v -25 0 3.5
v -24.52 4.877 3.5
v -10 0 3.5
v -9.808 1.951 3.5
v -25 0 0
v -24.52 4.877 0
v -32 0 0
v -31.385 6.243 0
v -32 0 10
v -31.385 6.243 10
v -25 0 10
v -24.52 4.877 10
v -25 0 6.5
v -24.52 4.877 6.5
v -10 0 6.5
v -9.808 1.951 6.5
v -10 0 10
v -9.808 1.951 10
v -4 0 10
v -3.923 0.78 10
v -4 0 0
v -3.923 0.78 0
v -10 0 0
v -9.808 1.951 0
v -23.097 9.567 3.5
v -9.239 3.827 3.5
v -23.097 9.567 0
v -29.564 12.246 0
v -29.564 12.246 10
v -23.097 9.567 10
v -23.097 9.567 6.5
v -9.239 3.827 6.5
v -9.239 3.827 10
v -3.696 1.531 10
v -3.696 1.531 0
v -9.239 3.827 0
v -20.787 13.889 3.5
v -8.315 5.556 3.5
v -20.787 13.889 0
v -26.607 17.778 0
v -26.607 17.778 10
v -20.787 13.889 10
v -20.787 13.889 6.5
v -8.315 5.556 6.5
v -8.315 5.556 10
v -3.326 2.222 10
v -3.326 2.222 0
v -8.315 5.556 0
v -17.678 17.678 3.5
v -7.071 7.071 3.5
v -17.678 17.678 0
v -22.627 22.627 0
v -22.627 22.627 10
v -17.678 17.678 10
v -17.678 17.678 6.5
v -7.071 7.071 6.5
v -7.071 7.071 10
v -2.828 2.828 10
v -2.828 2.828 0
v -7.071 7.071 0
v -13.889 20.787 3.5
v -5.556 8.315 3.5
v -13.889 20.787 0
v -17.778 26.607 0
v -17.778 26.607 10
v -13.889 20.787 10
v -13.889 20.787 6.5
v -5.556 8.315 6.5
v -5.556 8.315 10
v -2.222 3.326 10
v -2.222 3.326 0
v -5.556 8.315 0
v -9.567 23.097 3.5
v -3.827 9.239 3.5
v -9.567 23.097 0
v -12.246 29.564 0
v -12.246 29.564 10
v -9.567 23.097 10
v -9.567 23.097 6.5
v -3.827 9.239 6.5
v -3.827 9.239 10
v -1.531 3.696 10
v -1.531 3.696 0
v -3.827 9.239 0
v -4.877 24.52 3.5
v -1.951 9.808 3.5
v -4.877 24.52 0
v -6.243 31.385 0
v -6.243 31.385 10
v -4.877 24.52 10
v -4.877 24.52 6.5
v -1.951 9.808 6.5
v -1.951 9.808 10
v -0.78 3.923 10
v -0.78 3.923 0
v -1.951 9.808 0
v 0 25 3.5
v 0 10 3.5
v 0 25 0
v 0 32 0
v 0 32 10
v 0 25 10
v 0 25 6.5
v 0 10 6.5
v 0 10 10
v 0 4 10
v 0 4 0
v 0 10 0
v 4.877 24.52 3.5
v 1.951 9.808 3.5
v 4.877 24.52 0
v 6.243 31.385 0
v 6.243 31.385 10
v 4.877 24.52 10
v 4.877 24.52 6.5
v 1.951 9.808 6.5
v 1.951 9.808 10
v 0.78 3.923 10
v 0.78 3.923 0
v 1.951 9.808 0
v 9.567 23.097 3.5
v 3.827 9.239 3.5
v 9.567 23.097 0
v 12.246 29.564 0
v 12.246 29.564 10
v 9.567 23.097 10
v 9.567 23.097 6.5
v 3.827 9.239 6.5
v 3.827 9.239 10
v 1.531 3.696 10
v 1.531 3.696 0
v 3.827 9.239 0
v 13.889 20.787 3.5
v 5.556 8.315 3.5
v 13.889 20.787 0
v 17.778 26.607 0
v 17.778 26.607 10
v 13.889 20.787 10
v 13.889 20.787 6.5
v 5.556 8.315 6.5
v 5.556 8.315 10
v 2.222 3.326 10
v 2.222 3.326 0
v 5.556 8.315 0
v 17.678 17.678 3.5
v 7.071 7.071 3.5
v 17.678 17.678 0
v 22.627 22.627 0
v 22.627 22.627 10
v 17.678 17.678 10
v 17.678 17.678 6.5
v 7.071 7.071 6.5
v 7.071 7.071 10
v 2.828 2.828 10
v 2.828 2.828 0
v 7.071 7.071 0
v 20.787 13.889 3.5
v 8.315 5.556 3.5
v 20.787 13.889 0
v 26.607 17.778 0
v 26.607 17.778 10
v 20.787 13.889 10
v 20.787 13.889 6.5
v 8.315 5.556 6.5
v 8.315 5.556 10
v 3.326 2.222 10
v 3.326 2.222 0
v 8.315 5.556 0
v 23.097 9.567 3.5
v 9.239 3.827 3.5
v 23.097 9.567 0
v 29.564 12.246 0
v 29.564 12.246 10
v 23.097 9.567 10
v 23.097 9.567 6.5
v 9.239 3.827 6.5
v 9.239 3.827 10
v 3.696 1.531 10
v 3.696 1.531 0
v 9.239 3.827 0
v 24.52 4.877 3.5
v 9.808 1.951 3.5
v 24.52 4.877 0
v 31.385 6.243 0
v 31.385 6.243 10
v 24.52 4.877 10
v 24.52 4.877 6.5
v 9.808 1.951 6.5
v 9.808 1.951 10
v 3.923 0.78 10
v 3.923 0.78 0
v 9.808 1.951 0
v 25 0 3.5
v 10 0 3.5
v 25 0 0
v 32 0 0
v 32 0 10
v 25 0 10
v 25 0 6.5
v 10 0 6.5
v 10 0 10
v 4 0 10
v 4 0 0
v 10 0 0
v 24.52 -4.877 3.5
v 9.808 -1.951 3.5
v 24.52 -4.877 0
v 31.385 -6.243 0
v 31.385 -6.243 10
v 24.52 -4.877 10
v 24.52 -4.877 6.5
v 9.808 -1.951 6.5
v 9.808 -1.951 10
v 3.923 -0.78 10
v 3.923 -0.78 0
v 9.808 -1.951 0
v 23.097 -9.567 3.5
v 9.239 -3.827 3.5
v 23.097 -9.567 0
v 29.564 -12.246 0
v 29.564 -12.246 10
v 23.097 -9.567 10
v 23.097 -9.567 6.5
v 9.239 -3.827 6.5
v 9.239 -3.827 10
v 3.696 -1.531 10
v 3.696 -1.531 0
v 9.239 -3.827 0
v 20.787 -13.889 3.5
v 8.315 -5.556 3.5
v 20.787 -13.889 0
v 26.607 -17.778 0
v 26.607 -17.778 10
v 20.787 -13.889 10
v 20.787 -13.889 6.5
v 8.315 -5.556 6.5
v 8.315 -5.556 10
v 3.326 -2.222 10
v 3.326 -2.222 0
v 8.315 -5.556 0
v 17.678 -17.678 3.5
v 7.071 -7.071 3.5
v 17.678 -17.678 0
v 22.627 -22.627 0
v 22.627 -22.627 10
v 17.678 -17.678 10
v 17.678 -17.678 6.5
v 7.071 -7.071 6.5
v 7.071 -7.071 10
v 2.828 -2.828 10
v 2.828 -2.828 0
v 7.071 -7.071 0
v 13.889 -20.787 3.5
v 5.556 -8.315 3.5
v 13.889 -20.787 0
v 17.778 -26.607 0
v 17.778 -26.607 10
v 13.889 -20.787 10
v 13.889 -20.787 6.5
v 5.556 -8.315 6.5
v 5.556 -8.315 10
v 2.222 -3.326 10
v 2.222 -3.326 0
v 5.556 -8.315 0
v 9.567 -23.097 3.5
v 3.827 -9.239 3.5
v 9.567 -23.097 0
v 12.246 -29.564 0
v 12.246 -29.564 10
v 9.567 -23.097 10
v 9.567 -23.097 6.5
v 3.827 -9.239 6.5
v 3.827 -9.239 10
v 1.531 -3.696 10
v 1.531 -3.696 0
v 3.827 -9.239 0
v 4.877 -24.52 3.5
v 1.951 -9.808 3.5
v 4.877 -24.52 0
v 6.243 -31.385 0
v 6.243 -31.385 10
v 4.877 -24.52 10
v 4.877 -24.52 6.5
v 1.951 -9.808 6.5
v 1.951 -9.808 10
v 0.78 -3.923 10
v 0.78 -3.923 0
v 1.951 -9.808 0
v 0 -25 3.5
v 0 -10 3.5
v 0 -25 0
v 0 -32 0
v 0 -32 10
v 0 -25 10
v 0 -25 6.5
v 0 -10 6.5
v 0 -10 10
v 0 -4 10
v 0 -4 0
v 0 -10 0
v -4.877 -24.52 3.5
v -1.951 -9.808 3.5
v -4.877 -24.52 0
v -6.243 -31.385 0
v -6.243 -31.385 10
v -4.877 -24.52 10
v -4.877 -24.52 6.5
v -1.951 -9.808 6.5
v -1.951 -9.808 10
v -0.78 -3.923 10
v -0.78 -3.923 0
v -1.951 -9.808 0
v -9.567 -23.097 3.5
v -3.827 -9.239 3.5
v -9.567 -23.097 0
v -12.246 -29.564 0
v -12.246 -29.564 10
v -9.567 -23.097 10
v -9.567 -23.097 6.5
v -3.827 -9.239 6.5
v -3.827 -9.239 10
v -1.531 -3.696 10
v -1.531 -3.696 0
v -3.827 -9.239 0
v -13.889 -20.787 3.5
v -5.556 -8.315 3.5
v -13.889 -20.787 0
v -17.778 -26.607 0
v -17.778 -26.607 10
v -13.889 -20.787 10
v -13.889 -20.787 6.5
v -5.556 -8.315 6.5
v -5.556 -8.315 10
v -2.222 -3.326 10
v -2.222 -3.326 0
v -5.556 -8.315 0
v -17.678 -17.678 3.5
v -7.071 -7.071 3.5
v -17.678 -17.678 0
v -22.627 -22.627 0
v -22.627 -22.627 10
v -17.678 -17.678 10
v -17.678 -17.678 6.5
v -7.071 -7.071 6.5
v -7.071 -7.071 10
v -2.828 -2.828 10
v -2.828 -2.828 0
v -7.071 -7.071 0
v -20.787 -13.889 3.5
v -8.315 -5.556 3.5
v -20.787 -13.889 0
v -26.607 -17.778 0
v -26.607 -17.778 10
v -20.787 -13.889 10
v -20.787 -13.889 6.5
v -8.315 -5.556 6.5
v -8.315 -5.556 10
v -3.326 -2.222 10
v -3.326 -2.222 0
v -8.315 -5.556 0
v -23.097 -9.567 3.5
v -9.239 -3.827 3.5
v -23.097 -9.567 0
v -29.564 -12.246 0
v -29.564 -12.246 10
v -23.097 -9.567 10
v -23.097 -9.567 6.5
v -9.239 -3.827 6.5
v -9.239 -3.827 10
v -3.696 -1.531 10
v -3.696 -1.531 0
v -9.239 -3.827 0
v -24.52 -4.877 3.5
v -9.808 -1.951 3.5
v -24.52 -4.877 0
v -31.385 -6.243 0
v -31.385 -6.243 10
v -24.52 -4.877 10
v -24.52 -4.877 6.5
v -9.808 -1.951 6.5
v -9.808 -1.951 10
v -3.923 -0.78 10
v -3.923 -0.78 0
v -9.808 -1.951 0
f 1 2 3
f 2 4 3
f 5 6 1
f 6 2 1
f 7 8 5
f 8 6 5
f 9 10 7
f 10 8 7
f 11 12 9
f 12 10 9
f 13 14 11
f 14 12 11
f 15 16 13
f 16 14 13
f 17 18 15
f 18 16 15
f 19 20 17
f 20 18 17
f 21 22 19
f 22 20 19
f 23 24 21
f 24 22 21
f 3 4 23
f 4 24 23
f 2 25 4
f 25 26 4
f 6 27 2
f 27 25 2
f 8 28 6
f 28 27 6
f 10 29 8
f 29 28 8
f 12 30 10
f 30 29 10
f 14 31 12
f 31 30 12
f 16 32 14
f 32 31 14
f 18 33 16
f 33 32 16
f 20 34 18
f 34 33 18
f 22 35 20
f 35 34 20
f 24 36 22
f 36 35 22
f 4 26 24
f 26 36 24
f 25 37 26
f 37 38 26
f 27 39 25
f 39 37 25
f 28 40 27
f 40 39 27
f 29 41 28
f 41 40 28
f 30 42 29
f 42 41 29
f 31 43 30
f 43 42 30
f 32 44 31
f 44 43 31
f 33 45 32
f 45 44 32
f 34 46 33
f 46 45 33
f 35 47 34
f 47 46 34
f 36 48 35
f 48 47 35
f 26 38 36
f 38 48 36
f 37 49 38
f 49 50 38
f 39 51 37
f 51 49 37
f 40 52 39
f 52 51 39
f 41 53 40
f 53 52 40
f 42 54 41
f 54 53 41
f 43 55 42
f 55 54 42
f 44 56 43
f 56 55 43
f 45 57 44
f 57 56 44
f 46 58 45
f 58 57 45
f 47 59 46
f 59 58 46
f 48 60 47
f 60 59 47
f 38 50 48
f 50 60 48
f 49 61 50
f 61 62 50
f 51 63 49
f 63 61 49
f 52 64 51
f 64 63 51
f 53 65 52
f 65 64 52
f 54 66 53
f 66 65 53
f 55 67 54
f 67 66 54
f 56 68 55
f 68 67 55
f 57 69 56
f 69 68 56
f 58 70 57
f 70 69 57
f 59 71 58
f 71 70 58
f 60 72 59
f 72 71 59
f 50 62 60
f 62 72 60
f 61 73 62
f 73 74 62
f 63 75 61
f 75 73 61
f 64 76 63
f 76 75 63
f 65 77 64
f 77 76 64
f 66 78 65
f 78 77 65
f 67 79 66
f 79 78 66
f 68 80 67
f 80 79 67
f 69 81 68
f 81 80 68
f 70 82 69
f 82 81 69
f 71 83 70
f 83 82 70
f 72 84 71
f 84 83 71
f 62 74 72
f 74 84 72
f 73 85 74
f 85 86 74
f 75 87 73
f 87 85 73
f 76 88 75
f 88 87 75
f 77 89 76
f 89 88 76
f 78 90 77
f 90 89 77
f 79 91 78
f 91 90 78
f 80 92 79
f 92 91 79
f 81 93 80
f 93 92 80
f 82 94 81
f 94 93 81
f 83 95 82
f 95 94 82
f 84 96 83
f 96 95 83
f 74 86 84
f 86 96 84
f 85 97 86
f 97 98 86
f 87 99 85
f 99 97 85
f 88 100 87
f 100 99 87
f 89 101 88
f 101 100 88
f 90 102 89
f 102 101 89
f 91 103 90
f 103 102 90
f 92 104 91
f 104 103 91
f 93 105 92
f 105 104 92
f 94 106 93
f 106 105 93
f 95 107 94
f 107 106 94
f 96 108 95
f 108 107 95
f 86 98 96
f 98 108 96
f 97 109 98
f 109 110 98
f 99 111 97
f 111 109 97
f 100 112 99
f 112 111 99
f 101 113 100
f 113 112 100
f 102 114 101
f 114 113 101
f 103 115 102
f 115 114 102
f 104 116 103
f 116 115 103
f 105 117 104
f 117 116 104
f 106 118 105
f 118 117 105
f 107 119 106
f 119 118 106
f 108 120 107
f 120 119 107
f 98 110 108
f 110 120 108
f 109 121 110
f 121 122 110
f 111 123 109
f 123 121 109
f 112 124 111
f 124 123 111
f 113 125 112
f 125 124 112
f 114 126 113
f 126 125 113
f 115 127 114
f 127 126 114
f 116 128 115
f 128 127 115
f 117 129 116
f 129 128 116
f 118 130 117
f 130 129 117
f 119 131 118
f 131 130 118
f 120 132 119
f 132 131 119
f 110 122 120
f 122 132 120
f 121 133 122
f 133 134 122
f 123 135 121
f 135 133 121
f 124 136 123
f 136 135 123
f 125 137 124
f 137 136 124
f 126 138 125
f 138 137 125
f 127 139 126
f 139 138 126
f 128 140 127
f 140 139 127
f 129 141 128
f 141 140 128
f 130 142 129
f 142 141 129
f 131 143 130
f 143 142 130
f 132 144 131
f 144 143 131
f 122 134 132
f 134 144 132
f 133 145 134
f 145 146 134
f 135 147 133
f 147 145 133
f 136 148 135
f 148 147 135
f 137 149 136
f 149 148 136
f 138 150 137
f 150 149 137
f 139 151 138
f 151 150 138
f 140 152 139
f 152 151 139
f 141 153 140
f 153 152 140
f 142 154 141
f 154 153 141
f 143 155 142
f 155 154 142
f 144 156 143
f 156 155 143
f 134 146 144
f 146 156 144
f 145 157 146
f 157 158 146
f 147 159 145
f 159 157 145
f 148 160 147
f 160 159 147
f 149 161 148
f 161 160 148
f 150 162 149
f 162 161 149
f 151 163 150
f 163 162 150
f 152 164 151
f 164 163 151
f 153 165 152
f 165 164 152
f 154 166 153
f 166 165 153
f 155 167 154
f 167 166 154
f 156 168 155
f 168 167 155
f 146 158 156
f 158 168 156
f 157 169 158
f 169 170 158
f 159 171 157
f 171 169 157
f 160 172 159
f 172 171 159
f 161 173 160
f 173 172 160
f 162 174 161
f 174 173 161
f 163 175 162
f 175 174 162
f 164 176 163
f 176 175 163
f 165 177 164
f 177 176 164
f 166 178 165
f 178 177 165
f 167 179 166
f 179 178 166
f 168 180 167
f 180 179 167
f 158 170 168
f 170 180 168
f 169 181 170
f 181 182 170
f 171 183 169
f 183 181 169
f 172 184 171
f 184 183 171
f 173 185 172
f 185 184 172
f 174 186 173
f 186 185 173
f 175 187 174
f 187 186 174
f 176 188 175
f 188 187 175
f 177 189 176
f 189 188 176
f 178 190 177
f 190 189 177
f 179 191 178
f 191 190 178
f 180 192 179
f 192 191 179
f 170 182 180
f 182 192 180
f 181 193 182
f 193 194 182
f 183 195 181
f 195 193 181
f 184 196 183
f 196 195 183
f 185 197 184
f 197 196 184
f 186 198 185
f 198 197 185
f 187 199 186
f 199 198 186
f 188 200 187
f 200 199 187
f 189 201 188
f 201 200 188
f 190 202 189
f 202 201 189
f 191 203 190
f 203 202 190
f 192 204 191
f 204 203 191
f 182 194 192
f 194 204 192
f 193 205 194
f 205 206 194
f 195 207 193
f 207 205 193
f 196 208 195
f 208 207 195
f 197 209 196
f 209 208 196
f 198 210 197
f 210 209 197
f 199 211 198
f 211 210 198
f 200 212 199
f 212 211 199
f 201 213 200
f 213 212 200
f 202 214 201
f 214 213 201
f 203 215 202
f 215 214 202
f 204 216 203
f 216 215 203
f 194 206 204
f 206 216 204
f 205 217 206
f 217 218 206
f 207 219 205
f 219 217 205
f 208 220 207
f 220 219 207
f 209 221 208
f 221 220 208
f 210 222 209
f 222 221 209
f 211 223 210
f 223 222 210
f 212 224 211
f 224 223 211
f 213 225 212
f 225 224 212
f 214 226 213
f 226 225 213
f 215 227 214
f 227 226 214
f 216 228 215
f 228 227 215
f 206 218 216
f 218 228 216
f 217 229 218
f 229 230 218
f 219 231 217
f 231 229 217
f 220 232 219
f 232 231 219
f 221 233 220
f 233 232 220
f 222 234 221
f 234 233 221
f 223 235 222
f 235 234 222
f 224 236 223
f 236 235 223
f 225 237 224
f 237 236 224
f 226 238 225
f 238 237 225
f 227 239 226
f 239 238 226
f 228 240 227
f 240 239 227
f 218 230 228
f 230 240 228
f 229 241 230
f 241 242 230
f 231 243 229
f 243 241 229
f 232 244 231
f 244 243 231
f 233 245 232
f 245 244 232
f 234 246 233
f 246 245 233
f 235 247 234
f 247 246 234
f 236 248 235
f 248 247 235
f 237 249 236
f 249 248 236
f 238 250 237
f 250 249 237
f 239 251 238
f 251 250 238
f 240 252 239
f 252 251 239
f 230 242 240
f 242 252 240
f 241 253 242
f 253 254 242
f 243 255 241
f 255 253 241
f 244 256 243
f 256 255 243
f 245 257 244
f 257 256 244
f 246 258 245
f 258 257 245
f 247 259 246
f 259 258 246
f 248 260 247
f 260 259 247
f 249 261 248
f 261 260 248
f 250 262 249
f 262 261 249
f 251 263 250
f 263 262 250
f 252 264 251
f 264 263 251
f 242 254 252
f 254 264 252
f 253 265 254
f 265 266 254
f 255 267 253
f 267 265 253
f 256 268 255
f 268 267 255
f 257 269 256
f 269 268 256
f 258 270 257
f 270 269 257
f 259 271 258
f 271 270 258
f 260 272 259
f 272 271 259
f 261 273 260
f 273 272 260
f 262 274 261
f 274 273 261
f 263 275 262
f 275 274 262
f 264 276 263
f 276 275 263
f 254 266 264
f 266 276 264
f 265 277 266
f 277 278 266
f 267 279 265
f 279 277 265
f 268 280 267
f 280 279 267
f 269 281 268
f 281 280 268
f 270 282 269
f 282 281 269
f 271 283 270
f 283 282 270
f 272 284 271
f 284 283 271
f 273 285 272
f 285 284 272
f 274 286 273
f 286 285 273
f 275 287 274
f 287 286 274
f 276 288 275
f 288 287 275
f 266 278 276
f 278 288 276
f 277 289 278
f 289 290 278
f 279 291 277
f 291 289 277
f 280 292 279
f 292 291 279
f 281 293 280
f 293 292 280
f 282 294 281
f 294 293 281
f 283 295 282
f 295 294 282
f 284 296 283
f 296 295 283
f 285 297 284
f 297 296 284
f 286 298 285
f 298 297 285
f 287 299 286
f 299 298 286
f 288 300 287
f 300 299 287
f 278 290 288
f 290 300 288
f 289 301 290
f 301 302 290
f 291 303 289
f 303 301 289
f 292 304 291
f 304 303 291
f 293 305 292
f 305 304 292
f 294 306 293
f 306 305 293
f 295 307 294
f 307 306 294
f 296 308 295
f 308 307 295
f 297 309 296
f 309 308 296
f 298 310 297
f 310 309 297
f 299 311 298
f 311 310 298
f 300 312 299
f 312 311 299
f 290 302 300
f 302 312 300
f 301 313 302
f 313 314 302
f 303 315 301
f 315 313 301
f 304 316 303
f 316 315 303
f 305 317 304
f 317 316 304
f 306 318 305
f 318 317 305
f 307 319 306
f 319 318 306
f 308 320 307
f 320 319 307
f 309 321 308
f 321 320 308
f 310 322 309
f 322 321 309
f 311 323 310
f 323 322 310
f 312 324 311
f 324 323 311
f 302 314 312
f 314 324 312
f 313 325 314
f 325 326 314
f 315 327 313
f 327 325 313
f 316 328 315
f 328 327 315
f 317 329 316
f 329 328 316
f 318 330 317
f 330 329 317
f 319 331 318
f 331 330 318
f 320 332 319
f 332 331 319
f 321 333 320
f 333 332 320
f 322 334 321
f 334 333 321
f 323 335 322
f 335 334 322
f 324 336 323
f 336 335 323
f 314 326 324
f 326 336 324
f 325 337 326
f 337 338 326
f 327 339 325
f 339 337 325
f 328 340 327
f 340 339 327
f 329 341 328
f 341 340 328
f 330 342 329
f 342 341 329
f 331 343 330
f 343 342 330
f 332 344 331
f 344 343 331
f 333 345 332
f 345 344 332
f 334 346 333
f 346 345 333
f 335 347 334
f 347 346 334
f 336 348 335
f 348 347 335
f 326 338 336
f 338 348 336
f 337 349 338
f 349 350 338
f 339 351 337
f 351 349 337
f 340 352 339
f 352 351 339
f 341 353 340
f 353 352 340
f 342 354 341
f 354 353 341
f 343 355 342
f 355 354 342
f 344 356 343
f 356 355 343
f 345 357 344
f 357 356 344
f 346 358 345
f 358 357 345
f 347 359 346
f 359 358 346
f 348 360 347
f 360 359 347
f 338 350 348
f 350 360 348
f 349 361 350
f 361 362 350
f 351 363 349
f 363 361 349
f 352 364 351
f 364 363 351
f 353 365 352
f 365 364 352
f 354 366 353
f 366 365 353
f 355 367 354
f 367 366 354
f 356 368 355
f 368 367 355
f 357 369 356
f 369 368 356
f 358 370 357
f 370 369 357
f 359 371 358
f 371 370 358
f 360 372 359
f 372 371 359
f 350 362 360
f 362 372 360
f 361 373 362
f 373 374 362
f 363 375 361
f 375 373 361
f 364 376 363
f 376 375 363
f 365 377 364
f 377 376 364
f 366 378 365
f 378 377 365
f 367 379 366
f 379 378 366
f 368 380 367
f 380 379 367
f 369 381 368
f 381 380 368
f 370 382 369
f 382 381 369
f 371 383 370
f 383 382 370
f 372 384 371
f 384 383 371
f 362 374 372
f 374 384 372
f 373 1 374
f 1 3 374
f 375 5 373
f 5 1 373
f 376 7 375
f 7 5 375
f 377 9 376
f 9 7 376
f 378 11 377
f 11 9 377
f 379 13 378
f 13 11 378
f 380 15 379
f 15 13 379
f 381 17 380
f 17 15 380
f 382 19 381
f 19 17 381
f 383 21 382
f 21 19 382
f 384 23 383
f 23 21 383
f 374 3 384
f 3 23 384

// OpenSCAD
$fn = 32;

// ----------------------------------------------------------------------
// Revolved part: handwheel R32
// ----------------------------------------------------------------------

// --- parameters (mm) ---
bore_r = 4;               // bore radius
rim_r = 32;               // rim radius
rim_w = 7;                // rim axial width
rim_t = 10;               // rim diameter height
hub_r = 10;               // hub radius
web_t = 3;                // web thickness
revolve_angle = 360;      // revolve sweep, degrees

bore_d = 2 * bore_r;
rim_d = 2 * rim_r;
hub_d = 2 * hub_r;

profile = [[4, 0], [10, 0], [10, 3.5], [25, 3.5], [25, 0], [32, 0], [32, 10], [25, 10], [25, 6.5], [10, 6.5], [10, 10], [4, 10]];  // primary outline, 12 points, counter clockwise

// --- the one profile operation ---
rotate_extrude(angle = revolve_angle) polygon(points = profile);
